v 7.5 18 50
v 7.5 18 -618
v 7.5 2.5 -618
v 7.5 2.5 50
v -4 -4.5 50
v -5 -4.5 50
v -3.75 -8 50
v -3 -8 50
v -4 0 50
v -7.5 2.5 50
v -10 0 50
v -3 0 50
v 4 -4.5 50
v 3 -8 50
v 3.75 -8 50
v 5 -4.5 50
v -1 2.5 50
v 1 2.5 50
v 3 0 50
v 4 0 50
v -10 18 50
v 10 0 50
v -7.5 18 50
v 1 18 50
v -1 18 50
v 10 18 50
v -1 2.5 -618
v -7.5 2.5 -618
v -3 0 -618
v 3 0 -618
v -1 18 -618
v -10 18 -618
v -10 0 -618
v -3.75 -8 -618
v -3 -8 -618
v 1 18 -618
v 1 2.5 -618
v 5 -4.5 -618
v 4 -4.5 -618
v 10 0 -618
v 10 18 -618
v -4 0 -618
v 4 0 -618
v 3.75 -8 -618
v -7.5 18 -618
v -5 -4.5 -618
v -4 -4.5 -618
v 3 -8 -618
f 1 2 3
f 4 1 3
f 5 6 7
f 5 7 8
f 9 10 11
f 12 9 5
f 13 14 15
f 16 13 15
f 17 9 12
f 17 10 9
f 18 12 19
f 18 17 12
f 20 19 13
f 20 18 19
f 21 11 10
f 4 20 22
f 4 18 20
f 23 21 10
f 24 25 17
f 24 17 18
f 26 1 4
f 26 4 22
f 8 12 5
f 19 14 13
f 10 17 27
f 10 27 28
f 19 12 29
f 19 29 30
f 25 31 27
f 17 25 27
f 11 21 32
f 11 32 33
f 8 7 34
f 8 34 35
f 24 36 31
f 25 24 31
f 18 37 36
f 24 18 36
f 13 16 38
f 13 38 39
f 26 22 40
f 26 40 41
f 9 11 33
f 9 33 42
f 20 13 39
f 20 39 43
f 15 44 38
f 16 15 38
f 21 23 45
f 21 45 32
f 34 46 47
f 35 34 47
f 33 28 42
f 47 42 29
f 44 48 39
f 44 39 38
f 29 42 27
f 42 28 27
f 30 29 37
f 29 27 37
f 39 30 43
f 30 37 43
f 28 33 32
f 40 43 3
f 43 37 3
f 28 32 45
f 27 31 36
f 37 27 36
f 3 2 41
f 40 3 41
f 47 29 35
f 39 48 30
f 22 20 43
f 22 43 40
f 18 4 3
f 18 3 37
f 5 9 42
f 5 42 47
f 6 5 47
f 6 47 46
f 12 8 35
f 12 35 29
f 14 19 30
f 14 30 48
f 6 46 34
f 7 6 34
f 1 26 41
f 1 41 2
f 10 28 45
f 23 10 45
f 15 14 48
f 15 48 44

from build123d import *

# Parameters (mm, degrees)
BOSS_EXTRU_1_DEPTH = 668


with BuildPart() as part:
    # Esquisse1 → Boss.-Extru.1 (new body)
    with BuildSketch(Plane.XY.offset(50)):
        Polygon((-1, 2.5), (-7.5, 2.5), (-7.5, 17.999999998), (-10, 17.999999998), (-10, 0), (-4, 0), (-4, -4.5), (-5, -4.5), (-3.75, -8), (-3, -8), (-3, 0), (3, 0), (3, -8), (3.75, -8), (5, -4.5), (4, -4.5), (4, 0), (10, 0), (10, 17.999999998), (7.5, 17.999999998), (7.5, 2.5), (1, 2.5), (1, 17.999999998), (-1, 17.999999998), align=None)
    extrude(amount=-BOSS_EXTRU_1_DEPTH)


solid = part.part
